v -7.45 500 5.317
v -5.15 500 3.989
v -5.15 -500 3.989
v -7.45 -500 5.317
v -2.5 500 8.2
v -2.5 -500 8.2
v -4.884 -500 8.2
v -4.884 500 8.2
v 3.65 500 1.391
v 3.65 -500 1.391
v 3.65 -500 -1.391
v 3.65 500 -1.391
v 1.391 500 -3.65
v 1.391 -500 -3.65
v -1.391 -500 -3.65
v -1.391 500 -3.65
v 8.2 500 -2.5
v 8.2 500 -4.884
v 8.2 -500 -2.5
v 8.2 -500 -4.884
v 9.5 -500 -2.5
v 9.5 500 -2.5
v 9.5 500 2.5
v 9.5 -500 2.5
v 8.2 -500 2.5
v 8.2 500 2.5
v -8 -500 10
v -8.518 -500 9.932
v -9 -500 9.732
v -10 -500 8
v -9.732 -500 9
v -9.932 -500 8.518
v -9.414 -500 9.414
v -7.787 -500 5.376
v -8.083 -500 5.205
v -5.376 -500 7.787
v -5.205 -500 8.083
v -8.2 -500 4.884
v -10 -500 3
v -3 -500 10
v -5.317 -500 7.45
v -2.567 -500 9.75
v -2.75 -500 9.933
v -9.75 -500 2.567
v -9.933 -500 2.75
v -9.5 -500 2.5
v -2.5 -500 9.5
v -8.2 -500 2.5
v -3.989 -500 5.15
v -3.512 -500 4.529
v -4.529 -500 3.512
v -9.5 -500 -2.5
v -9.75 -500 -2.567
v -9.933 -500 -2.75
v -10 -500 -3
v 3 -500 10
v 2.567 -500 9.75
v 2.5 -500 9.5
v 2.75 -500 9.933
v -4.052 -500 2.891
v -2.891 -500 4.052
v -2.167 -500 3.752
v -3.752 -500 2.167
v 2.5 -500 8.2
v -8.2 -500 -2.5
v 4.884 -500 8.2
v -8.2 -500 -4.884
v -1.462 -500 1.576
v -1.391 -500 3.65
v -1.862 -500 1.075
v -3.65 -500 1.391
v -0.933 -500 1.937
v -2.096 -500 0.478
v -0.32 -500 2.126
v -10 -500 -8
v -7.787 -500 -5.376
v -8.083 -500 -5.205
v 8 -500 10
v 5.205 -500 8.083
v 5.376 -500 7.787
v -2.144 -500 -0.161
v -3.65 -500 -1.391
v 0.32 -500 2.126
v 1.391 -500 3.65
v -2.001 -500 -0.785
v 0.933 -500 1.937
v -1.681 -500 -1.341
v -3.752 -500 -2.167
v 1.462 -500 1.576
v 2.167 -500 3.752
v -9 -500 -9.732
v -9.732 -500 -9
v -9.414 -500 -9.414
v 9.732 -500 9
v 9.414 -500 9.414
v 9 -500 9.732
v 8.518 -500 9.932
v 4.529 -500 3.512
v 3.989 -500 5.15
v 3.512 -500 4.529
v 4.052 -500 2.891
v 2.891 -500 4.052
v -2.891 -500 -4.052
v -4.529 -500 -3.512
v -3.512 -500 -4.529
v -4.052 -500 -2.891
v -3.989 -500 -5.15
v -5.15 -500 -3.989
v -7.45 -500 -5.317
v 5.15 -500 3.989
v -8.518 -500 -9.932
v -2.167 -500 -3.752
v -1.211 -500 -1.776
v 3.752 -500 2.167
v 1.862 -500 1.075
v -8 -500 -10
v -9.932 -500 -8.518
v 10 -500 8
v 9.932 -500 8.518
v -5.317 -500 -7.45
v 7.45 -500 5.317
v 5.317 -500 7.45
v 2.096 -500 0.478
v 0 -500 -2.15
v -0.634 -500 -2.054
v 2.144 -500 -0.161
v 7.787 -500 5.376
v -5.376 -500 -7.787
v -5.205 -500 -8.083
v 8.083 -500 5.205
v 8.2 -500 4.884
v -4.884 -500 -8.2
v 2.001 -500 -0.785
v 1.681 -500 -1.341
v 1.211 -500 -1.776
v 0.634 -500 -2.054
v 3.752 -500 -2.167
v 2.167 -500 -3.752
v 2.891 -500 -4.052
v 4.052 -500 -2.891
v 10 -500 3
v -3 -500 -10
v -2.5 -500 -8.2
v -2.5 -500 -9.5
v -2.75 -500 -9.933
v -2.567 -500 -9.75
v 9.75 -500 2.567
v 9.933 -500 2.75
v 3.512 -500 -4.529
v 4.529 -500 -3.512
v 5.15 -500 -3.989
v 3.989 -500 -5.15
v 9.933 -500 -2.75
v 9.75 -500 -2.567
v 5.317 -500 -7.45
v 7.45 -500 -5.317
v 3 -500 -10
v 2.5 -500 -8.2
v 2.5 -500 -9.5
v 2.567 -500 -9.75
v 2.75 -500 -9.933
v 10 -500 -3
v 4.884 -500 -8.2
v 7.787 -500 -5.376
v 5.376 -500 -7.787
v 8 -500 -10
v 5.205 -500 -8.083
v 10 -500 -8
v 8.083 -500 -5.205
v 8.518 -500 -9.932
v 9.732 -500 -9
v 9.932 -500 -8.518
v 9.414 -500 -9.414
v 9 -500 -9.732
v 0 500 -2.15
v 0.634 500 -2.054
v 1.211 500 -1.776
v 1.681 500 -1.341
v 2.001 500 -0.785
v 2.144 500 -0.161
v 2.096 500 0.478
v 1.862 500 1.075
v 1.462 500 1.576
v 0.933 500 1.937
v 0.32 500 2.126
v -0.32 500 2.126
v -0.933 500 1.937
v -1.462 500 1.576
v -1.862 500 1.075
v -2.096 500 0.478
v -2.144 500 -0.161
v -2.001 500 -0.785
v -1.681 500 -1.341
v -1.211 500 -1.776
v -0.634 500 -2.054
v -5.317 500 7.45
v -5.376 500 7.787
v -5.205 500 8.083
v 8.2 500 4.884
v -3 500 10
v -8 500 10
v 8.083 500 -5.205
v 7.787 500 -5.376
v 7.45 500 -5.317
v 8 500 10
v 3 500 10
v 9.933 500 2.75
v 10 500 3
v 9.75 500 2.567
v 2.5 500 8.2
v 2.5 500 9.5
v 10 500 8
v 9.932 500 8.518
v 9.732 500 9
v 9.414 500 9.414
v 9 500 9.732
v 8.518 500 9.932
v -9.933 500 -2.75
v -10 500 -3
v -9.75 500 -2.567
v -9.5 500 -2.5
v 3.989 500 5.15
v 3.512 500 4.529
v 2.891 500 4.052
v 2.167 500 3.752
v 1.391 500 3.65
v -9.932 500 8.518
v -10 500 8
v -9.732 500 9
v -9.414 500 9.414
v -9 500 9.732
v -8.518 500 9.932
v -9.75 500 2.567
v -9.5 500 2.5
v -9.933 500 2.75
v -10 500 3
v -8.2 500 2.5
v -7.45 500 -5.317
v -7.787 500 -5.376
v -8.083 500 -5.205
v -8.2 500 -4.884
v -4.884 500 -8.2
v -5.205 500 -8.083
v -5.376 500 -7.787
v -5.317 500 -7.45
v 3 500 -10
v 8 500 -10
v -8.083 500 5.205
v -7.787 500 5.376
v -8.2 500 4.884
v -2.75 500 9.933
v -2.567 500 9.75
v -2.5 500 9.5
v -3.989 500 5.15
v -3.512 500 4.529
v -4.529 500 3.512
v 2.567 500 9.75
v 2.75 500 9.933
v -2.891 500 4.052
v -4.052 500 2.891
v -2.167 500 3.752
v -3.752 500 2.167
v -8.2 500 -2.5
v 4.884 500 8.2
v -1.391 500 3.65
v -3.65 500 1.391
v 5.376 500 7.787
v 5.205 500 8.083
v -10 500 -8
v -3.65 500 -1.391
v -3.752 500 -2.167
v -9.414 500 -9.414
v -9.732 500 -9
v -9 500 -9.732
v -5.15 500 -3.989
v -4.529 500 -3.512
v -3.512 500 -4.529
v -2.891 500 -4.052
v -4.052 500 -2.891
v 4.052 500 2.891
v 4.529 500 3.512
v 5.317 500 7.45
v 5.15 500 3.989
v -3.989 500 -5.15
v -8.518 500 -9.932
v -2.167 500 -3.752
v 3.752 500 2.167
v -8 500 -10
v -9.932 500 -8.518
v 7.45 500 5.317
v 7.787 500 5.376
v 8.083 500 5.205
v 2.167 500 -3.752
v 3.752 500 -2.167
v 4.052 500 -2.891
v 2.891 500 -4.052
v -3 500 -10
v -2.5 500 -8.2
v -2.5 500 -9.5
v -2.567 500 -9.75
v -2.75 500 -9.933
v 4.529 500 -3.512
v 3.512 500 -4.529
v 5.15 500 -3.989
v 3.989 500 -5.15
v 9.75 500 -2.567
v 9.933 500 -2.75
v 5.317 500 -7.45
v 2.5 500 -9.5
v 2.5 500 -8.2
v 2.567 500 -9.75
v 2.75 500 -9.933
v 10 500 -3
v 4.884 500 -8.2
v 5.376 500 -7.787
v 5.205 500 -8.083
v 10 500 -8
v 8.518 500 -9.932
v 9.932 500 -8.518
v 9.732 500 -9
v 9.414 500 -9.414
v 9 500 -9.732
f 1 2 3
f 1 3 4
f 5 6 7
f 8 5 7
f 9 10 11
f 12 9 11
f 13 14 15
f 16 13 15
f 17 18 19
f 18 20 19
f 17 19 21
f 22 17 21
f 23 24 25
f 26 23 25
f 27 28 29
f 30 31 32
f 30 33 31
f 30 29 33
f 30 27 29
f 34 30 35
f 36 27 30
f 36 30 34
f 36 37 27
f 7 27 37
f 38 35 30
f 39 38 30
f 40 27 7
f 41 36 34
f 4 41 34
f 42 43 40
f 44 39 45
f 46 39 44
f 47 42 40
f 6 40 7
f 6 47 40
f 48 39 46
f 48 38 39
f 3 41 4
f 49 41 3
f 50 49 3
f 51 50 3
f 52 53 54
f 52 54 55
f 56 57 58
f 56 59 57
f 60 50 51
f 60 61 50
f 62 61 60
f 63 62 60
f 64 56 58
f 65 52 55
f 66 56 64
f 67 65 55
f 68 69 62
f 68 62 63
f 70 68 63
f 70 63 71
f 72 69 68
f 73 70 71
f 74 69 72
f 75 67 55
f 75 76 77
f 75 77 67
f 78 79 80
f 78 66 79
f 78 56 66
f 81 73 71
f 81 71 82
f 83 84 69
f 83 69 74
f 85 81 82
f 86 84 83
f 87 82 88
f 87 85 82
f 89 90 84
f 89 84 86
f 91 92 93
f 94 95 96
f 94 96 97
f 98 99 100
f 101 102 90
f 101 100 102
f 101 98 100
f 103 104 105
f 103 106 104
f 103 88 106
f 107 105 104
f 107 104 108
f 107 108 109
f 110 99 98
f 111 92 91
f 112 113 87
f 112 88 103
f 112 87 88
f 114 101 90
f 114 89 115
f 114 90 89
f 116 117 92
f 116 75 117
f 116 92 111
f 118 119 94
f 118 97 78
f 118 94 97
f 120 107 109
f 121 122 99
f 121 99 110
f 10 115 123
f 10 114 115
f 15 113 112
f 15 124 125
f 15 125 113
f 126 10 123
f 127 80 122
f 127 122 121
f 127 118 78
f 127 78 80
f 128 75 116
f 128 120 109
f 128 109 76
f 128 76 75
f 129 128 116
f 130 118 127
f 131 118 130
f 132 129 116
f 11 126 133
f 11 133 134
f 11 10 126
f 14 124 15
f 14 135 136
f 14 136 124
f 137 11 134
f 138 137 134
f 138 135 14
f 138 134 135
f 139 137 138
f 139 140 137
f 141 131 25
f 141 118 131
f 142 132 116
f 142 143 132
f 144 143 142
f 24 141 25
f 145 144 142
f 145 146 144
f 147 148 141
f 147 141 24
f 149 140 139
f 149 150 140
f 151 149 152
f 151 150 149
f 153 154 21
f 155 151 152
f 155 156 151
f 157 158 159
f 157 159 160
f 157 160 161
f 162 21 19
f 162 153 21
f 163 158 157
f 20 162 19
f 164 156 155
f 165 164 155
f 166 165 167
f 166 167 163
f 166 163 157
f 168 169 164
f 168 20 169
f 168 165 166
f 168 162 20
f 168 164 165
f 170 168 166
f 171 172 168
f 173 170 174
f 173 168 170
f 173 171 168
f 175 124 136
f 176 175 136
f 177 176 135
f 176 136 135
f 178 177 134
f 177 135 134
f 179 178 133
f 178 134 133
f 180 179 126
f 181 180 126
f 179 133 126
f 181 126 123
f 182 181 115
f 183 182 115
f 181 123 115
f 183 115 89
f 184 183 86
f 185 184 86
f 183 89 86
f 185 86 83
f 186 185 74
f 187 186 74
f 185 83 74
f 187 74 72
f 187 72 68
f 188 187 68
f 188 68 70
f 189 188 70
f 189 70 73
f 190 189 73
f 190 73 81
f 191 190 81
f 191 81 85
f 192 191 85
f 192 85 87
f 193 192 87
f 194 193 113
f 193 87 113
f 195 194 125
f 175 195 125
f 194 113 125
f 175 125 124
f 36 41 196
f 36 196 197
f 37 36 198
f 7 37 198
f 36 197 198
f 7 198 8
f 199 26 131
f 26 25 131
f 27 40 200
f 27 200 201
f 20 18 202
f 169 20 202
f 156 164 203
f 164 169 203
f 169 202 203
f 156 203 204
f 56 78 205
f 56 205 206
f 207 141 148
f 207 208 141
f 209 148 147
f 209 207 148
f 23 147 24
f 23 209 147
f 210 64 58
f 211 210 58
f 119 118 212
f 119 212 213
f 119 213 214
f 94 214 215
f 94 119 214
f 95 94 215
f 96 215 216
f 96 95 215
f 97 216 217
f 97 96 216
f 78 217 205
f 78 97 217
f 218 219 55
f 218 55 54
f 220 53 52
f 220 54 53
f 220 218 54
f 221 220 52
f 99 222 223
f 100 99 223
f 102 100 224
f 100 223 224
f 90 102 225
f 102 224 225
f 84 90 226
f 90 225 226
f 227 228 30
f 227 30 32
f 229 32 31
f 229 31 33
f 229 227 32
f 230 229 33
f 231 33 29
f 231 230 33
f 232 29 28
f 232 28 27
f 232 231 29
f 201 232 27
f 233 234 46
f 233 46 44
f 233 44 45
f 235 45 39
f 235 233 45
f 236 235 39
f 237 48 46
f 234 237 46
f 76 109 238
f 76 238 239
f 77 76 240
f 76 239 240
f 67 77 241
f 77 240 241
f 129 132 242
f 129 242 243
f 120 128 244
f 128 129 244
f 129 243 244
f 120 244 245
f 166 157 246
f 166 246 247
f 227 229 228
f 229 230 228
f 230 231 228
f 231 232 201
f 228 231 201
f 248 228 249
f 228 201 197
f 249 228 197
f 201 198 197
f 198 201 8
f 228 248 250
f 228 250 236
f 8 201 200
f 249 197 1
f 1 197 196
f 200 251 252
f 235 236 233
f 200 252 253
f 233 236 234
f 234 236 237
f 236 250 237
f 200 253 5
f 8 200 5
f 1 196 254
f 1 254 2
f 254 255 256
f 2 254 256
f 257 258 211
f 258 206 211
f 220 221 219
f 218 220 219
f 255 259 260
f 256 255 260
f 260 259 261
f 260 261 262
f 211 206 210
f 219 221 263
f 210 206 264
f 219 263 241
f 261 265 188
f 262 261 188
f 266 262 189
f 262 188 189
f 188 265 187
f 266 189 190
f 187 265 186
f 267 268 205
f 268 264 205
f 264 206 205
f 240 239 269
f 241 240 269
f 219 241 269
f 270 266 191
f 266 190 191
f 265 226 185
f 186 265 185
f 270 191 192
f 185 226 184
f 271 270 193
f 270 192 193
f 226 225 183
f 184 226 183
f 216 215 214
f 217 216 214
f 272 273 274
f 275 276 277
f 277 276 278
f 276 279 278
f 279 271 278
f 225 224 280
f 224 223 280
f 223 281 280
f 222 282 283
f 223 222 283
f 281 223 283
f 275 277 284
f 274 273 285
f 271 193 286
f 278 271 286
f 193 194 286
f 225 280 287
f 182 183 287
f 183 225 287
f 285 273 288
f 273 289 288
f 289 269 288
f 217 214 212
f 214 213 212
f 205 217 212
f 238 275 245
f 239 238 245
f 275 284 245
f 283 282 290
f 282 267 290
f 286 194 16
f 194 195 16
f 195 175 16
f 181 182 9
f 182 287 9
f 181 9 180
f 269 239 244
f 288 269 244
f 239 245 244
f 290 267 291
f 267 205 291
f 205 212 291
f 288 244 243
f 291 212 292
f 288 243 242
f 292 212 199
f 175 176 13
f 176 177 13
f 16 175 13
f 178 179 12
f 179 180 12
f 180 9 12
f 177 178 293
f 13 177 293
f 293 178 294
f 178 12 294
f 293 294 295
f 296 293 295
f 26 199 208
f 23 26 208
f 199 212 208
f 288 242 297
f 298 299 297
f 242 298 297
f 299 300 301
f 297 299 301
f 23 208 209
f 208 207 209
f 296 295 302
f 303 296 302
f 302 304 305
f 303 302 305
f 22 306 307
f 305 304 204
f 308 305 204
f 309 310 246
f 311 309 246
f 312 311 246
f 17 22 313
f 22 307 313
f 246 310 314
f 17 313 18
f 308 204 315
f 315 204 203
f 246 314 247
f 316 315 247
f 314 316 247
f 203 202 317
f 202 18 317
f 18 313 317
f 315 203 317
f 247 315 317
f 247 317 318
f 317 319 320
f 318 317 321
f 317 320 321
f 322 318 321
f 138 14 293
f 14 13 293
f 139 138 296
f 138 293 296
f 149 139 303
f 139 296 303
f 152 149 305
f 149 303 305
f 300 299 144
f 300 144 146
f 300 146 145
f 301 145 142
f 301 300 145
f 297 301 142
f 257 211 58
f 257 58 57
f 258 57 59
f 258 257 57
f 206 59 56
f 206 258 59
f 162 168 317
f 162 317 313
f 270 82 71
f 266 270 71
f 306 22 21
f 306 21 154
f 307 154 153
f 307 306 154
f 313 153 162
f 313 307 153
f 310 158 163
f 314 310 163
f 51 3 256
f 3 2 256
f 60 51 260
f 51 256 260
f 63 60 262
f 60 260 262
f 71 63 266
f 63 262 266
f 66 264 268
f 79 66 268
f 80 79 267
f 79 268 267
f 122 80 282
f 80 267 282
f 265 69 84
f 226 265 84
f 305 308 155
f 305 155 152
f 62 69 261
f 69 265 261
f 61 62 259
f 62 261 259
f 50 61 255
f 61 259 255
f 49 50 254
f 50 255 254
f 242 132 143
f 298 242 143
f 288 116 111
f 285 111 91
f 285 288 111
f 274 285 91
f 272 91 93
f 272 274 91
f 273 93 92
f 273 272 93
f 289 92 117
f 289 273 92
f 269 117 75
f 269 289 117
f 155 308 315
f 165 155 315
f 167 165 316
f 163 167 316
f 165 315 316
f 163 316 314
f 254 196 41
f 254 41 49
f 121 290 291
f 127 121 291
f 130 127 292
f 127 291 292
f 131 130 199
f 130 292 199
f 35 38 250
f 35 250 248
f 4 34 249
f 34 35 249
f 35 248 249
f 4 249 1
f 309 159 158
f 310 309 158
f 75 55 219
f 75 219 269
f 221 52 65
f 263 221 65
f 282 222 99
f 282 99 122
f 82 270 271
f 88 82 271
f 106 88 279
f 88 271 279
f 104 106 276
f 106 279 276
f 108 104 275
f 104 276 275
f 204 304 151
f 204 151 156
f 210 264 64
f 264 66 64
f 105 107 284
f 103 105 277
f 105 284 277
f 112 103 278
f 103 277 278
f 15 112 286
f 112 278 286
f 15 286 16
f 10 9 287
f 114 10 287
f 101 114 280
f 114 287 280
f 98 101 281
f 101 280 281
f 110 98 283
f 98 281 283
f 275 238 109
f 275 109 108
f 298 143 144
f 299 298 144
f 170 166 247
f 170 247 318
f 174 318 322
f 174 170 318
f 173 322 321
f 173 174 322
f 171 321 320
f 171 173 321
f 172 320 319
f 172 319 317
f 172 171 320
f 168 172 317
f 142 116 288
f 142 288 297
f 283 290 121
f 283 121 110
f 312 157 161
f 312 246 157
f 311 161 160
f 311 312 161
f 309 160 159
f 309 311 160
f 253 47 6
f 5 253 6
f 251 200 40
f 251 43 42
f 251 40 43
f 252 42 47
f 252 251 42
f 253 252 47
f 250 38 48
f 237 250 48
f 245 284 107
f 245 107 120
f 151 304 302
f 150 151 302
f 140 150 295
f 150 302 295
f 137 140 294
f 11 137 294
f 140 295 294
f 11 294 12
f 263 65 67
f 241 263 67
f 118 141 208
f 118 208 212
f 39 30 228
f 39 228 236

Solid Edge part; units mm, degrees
sketch "Sketch1" plane through (0, 0, 0) normal (0, -1, 0) x (1, 0, 0)
  line L0 (-10, -10) -> (10, -10)
  line L1 (10, -10) -> (10, 10)
  line L2 (10, 10) -> (-10, 10)
  line L3 (-10, 10) -> (-10, -10)
  dimension "D1" = 20
  dimension "D2" = 20
extrude "Protrusion1" add sketch "Sketch1" along normal mid plane 1000
sketch "Sketch2" plane through (0, -500, 0) normal (0, -1, 0) x (1, 0, 0)
  line L0 (-2.5, 10) -> (-2.5, 8.2)
  line L1 (-2.5, 8.2) -> (-5.75, 8.2)
  line L2 (-5.75, 8.2) -> (-3.1231, 3.65)
  line L3 (-3.1231, 3.65) -> (3.1231, 3.65)
  line L4 (3.1231, 3.65) -> (5.75, 8.2)
  line L5 (5.75, 8.2) -> (2.5, 8.2)
  line L6 (2.5, 8.2) -> (2.5, 10)
  line L7 (2.5, 10) -> (-2.5, 10)
  dimension "D1" = 11.5
  dimension "D2" = 1.8
  dimension "D3" = 5
  dimension "D4" = 6.35
extrude "Cutout1" cut sketch "Sketch2" against normal through all
fillet "Verrundung_1" radius 2 4 edges at (10, 0, 10) (-10, 0, 10) (10, 0, -10) (-10, 0, -10)
fillet "Verrundung_2" radius 3 2 edges at (-3.1231, 0, 3.65) (3.1231, 0, 3.65)
fillet "Verrundung_3" radius 0.5 4 edges at (-5.75, 0, 8.2) (5.75, 0, 8.2) (-2.5, 0, 10) (2.5, 0, 10)
hole "Bohrung_1" at (0, -500, 0) direction (0, 1, 0) diameter 4.3 end up to next
pattern_circular "Pattern1" count 4 over 360 about axis through (0, -500, 0) along (0, -1, 0) of "Cutout1"
fillet "Round1" radius 3 2 edges at (-3.65, 0, -3.1231) (-3.65, 0, 3.1231)
fillet "Round2" radius 0.5 4 edges at (-8.2, 0, -5.75) (-8.2, 0, 5.75) (-10, 0, -2.5) (-10, 0, 2.5)
fillet "Round3" radius 3 2 edges at (3.1231, 0, -3.65) (-3.1231, 0, -3.65)
fillet "Round4" radius 0.5 4 edges at (5.75, 0, -8.2) (-5.75, 0, -8.2) (2.5, 0, -10) (-2.5, 0, -10)
fillet "Round5" radius 3 2 edges at (3.65, 0, 3.1231) (3.65, 0, -3.1231)
fillet "Round6" radius 0.5 4 edges at (8.2, 0, 5.75) (8.2, 0, -5.75) (10, 0, 2.5) (10, 0, -2.5)
